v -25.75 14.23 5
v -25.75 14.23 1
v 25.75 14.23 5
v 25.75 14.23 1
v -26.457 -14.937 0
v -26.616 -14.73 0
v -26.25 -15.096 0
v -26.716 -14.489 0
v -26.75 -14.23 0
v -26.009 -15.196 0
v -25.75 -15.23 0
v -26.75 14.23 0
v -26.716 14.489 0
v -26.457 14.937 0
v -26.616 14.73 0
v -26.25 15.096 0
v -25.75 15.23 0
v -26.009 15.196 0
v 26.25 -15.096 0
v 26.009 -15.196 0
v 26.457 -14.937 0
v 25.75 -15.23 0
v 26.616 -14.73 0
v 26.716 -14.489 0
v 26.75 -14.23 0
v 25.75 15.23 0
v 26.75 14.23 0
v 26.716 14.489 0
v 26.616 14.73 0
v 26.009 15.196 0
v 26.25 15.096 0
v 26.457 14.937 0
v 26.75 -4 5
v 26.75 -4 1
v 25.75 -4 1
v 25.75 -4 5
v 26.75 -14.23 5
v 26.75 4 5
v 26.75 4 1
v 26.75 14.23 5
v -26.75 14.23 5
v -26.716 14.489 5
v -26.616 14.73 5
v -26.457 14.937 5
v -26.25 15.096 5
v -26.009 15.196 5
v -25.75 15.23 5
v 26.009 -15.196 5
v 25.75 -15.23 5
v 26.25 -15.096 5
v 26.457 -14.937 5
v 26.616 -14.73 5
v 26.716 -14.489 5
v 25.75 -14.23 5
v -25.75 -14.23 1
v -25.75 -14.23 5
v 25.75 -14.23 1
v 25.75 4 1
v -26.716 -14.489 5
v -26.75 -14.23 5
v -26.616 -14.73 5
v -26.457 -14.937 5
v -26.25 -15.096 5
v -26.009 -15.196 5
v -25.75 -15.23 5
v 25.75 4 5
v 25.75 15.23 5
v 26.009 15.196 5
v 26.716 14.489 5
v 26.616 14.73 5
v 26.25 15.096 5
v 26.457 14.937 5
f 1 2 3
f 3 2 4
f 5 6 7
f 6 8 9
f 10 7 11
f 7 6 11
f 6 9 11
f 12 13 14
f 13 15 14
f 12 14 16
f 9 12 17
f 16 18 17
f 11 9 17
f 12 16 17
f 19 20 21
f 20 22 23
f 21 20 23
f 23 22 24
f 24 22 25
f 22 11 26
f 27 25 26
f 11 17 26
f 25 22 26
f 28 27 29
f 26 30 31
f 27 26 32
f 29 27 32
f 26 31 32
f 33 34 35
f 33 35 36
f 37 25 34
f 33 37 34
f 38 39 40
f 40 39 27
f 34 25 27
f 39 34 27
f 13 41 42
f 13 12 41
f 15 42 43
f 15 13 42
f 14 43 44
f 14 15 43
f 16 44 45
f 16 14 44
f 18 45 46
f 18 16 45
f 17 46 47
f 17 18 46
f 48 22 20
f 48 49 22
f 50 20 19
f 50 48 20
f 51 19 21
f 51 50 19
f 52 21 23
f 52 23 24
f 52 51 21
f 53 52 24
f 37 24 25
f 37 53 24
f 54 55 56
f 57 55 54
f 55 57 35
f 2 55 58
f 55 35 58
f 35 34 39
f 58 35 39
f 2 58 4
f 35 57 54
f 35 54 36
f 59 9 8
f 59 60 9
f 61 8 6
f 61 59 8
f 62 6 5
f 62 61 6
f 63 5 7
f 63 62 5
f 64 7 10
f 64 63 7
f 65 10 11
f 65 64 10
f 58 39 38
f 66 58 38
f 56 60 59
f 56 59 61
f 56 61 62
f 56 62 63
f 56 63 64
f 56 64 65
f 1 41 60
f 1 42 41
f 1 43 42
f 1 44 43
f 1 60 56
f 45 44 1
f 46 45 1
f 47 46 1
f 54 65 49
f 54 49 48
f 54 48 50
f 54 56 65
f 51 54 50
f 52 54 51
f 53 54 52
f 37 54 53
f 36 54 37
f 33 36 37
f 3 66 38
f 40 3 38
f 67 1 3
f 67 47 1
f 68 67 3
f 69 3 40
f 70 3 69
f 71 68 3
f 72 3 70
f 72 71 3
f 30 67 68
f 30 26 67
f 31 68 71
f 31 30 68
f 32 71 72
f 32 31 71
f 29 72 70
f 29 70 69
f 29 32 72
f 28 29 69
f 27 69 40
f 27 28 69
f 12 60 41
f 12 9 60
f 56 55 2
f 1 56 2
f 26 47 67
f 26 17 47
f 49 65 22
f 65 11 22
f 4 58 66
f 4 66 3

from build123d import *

# Parameters (mm, degrees)
SKETCH_W      = 53.5
SKETCH_H      = 30.46
PAD_DEPTH     = 1
SKETCH001_W   = 53.5
SKETCH001_H   = 30.46
SKETCH001_W_2 = 51.5
SKETCH001_H_2 = 28.46
PAD001_DEPTH  = 4
SKETCH002_W   = 8
SKETCH002_H   = 4
POCKET_DEPTH  = 1
FILLET_R      = 1


with BuildPart() as part:
    # Sketch → Pad (new body)
    with BuildSketch(Plane.XY):
        Rectangle(SKETCH_W, SKETCH_H)
    extrude(amount=PAD_DEPTH)

    # Sketch001 (on Face6 of Pad) → Pad001 (join)
    with BuildSketch(Plane.XY.offset(1)):
        Rectangle(SKETCH001_W, SKETCH001_H)
        Rectangle(SKETCH001_W_2, SKETCH001_H_2, mode=Mode.SUBTRACT)
    extrude(amount=PAD001_DEPTH)

    # Sketch002 (on Face8 of Pad001) → Pocket (cut)
    with BuildSketch(Plane.YZ.offset(26.75)):
        with Locations((0, 3)):
            Rectangle(SKETCH002_W, SKETCH002_H)
    extrude(amount=-POCKET_DEPTH, mode=Mode.SUBTRACT)

    # Fillet
    fillet_edges = [part.edges().sort_by_distance(p)[0] for p in [
        (26.75, -15.23, 0.5),
        (26.75, -15.23, 3),
        (26.75, 15.23, 3),
        (26.75, 15.23, 0.5),
        (-26.75, 15.23, 3),
        (-26.75, 15.23, 0.5),
        (-26.75, -15.23, 3),
        (-26.75, -15.23, 0.5),
    ]]
    fillet(fillet_edges, radius=FILLET_R)


solid = part.part
